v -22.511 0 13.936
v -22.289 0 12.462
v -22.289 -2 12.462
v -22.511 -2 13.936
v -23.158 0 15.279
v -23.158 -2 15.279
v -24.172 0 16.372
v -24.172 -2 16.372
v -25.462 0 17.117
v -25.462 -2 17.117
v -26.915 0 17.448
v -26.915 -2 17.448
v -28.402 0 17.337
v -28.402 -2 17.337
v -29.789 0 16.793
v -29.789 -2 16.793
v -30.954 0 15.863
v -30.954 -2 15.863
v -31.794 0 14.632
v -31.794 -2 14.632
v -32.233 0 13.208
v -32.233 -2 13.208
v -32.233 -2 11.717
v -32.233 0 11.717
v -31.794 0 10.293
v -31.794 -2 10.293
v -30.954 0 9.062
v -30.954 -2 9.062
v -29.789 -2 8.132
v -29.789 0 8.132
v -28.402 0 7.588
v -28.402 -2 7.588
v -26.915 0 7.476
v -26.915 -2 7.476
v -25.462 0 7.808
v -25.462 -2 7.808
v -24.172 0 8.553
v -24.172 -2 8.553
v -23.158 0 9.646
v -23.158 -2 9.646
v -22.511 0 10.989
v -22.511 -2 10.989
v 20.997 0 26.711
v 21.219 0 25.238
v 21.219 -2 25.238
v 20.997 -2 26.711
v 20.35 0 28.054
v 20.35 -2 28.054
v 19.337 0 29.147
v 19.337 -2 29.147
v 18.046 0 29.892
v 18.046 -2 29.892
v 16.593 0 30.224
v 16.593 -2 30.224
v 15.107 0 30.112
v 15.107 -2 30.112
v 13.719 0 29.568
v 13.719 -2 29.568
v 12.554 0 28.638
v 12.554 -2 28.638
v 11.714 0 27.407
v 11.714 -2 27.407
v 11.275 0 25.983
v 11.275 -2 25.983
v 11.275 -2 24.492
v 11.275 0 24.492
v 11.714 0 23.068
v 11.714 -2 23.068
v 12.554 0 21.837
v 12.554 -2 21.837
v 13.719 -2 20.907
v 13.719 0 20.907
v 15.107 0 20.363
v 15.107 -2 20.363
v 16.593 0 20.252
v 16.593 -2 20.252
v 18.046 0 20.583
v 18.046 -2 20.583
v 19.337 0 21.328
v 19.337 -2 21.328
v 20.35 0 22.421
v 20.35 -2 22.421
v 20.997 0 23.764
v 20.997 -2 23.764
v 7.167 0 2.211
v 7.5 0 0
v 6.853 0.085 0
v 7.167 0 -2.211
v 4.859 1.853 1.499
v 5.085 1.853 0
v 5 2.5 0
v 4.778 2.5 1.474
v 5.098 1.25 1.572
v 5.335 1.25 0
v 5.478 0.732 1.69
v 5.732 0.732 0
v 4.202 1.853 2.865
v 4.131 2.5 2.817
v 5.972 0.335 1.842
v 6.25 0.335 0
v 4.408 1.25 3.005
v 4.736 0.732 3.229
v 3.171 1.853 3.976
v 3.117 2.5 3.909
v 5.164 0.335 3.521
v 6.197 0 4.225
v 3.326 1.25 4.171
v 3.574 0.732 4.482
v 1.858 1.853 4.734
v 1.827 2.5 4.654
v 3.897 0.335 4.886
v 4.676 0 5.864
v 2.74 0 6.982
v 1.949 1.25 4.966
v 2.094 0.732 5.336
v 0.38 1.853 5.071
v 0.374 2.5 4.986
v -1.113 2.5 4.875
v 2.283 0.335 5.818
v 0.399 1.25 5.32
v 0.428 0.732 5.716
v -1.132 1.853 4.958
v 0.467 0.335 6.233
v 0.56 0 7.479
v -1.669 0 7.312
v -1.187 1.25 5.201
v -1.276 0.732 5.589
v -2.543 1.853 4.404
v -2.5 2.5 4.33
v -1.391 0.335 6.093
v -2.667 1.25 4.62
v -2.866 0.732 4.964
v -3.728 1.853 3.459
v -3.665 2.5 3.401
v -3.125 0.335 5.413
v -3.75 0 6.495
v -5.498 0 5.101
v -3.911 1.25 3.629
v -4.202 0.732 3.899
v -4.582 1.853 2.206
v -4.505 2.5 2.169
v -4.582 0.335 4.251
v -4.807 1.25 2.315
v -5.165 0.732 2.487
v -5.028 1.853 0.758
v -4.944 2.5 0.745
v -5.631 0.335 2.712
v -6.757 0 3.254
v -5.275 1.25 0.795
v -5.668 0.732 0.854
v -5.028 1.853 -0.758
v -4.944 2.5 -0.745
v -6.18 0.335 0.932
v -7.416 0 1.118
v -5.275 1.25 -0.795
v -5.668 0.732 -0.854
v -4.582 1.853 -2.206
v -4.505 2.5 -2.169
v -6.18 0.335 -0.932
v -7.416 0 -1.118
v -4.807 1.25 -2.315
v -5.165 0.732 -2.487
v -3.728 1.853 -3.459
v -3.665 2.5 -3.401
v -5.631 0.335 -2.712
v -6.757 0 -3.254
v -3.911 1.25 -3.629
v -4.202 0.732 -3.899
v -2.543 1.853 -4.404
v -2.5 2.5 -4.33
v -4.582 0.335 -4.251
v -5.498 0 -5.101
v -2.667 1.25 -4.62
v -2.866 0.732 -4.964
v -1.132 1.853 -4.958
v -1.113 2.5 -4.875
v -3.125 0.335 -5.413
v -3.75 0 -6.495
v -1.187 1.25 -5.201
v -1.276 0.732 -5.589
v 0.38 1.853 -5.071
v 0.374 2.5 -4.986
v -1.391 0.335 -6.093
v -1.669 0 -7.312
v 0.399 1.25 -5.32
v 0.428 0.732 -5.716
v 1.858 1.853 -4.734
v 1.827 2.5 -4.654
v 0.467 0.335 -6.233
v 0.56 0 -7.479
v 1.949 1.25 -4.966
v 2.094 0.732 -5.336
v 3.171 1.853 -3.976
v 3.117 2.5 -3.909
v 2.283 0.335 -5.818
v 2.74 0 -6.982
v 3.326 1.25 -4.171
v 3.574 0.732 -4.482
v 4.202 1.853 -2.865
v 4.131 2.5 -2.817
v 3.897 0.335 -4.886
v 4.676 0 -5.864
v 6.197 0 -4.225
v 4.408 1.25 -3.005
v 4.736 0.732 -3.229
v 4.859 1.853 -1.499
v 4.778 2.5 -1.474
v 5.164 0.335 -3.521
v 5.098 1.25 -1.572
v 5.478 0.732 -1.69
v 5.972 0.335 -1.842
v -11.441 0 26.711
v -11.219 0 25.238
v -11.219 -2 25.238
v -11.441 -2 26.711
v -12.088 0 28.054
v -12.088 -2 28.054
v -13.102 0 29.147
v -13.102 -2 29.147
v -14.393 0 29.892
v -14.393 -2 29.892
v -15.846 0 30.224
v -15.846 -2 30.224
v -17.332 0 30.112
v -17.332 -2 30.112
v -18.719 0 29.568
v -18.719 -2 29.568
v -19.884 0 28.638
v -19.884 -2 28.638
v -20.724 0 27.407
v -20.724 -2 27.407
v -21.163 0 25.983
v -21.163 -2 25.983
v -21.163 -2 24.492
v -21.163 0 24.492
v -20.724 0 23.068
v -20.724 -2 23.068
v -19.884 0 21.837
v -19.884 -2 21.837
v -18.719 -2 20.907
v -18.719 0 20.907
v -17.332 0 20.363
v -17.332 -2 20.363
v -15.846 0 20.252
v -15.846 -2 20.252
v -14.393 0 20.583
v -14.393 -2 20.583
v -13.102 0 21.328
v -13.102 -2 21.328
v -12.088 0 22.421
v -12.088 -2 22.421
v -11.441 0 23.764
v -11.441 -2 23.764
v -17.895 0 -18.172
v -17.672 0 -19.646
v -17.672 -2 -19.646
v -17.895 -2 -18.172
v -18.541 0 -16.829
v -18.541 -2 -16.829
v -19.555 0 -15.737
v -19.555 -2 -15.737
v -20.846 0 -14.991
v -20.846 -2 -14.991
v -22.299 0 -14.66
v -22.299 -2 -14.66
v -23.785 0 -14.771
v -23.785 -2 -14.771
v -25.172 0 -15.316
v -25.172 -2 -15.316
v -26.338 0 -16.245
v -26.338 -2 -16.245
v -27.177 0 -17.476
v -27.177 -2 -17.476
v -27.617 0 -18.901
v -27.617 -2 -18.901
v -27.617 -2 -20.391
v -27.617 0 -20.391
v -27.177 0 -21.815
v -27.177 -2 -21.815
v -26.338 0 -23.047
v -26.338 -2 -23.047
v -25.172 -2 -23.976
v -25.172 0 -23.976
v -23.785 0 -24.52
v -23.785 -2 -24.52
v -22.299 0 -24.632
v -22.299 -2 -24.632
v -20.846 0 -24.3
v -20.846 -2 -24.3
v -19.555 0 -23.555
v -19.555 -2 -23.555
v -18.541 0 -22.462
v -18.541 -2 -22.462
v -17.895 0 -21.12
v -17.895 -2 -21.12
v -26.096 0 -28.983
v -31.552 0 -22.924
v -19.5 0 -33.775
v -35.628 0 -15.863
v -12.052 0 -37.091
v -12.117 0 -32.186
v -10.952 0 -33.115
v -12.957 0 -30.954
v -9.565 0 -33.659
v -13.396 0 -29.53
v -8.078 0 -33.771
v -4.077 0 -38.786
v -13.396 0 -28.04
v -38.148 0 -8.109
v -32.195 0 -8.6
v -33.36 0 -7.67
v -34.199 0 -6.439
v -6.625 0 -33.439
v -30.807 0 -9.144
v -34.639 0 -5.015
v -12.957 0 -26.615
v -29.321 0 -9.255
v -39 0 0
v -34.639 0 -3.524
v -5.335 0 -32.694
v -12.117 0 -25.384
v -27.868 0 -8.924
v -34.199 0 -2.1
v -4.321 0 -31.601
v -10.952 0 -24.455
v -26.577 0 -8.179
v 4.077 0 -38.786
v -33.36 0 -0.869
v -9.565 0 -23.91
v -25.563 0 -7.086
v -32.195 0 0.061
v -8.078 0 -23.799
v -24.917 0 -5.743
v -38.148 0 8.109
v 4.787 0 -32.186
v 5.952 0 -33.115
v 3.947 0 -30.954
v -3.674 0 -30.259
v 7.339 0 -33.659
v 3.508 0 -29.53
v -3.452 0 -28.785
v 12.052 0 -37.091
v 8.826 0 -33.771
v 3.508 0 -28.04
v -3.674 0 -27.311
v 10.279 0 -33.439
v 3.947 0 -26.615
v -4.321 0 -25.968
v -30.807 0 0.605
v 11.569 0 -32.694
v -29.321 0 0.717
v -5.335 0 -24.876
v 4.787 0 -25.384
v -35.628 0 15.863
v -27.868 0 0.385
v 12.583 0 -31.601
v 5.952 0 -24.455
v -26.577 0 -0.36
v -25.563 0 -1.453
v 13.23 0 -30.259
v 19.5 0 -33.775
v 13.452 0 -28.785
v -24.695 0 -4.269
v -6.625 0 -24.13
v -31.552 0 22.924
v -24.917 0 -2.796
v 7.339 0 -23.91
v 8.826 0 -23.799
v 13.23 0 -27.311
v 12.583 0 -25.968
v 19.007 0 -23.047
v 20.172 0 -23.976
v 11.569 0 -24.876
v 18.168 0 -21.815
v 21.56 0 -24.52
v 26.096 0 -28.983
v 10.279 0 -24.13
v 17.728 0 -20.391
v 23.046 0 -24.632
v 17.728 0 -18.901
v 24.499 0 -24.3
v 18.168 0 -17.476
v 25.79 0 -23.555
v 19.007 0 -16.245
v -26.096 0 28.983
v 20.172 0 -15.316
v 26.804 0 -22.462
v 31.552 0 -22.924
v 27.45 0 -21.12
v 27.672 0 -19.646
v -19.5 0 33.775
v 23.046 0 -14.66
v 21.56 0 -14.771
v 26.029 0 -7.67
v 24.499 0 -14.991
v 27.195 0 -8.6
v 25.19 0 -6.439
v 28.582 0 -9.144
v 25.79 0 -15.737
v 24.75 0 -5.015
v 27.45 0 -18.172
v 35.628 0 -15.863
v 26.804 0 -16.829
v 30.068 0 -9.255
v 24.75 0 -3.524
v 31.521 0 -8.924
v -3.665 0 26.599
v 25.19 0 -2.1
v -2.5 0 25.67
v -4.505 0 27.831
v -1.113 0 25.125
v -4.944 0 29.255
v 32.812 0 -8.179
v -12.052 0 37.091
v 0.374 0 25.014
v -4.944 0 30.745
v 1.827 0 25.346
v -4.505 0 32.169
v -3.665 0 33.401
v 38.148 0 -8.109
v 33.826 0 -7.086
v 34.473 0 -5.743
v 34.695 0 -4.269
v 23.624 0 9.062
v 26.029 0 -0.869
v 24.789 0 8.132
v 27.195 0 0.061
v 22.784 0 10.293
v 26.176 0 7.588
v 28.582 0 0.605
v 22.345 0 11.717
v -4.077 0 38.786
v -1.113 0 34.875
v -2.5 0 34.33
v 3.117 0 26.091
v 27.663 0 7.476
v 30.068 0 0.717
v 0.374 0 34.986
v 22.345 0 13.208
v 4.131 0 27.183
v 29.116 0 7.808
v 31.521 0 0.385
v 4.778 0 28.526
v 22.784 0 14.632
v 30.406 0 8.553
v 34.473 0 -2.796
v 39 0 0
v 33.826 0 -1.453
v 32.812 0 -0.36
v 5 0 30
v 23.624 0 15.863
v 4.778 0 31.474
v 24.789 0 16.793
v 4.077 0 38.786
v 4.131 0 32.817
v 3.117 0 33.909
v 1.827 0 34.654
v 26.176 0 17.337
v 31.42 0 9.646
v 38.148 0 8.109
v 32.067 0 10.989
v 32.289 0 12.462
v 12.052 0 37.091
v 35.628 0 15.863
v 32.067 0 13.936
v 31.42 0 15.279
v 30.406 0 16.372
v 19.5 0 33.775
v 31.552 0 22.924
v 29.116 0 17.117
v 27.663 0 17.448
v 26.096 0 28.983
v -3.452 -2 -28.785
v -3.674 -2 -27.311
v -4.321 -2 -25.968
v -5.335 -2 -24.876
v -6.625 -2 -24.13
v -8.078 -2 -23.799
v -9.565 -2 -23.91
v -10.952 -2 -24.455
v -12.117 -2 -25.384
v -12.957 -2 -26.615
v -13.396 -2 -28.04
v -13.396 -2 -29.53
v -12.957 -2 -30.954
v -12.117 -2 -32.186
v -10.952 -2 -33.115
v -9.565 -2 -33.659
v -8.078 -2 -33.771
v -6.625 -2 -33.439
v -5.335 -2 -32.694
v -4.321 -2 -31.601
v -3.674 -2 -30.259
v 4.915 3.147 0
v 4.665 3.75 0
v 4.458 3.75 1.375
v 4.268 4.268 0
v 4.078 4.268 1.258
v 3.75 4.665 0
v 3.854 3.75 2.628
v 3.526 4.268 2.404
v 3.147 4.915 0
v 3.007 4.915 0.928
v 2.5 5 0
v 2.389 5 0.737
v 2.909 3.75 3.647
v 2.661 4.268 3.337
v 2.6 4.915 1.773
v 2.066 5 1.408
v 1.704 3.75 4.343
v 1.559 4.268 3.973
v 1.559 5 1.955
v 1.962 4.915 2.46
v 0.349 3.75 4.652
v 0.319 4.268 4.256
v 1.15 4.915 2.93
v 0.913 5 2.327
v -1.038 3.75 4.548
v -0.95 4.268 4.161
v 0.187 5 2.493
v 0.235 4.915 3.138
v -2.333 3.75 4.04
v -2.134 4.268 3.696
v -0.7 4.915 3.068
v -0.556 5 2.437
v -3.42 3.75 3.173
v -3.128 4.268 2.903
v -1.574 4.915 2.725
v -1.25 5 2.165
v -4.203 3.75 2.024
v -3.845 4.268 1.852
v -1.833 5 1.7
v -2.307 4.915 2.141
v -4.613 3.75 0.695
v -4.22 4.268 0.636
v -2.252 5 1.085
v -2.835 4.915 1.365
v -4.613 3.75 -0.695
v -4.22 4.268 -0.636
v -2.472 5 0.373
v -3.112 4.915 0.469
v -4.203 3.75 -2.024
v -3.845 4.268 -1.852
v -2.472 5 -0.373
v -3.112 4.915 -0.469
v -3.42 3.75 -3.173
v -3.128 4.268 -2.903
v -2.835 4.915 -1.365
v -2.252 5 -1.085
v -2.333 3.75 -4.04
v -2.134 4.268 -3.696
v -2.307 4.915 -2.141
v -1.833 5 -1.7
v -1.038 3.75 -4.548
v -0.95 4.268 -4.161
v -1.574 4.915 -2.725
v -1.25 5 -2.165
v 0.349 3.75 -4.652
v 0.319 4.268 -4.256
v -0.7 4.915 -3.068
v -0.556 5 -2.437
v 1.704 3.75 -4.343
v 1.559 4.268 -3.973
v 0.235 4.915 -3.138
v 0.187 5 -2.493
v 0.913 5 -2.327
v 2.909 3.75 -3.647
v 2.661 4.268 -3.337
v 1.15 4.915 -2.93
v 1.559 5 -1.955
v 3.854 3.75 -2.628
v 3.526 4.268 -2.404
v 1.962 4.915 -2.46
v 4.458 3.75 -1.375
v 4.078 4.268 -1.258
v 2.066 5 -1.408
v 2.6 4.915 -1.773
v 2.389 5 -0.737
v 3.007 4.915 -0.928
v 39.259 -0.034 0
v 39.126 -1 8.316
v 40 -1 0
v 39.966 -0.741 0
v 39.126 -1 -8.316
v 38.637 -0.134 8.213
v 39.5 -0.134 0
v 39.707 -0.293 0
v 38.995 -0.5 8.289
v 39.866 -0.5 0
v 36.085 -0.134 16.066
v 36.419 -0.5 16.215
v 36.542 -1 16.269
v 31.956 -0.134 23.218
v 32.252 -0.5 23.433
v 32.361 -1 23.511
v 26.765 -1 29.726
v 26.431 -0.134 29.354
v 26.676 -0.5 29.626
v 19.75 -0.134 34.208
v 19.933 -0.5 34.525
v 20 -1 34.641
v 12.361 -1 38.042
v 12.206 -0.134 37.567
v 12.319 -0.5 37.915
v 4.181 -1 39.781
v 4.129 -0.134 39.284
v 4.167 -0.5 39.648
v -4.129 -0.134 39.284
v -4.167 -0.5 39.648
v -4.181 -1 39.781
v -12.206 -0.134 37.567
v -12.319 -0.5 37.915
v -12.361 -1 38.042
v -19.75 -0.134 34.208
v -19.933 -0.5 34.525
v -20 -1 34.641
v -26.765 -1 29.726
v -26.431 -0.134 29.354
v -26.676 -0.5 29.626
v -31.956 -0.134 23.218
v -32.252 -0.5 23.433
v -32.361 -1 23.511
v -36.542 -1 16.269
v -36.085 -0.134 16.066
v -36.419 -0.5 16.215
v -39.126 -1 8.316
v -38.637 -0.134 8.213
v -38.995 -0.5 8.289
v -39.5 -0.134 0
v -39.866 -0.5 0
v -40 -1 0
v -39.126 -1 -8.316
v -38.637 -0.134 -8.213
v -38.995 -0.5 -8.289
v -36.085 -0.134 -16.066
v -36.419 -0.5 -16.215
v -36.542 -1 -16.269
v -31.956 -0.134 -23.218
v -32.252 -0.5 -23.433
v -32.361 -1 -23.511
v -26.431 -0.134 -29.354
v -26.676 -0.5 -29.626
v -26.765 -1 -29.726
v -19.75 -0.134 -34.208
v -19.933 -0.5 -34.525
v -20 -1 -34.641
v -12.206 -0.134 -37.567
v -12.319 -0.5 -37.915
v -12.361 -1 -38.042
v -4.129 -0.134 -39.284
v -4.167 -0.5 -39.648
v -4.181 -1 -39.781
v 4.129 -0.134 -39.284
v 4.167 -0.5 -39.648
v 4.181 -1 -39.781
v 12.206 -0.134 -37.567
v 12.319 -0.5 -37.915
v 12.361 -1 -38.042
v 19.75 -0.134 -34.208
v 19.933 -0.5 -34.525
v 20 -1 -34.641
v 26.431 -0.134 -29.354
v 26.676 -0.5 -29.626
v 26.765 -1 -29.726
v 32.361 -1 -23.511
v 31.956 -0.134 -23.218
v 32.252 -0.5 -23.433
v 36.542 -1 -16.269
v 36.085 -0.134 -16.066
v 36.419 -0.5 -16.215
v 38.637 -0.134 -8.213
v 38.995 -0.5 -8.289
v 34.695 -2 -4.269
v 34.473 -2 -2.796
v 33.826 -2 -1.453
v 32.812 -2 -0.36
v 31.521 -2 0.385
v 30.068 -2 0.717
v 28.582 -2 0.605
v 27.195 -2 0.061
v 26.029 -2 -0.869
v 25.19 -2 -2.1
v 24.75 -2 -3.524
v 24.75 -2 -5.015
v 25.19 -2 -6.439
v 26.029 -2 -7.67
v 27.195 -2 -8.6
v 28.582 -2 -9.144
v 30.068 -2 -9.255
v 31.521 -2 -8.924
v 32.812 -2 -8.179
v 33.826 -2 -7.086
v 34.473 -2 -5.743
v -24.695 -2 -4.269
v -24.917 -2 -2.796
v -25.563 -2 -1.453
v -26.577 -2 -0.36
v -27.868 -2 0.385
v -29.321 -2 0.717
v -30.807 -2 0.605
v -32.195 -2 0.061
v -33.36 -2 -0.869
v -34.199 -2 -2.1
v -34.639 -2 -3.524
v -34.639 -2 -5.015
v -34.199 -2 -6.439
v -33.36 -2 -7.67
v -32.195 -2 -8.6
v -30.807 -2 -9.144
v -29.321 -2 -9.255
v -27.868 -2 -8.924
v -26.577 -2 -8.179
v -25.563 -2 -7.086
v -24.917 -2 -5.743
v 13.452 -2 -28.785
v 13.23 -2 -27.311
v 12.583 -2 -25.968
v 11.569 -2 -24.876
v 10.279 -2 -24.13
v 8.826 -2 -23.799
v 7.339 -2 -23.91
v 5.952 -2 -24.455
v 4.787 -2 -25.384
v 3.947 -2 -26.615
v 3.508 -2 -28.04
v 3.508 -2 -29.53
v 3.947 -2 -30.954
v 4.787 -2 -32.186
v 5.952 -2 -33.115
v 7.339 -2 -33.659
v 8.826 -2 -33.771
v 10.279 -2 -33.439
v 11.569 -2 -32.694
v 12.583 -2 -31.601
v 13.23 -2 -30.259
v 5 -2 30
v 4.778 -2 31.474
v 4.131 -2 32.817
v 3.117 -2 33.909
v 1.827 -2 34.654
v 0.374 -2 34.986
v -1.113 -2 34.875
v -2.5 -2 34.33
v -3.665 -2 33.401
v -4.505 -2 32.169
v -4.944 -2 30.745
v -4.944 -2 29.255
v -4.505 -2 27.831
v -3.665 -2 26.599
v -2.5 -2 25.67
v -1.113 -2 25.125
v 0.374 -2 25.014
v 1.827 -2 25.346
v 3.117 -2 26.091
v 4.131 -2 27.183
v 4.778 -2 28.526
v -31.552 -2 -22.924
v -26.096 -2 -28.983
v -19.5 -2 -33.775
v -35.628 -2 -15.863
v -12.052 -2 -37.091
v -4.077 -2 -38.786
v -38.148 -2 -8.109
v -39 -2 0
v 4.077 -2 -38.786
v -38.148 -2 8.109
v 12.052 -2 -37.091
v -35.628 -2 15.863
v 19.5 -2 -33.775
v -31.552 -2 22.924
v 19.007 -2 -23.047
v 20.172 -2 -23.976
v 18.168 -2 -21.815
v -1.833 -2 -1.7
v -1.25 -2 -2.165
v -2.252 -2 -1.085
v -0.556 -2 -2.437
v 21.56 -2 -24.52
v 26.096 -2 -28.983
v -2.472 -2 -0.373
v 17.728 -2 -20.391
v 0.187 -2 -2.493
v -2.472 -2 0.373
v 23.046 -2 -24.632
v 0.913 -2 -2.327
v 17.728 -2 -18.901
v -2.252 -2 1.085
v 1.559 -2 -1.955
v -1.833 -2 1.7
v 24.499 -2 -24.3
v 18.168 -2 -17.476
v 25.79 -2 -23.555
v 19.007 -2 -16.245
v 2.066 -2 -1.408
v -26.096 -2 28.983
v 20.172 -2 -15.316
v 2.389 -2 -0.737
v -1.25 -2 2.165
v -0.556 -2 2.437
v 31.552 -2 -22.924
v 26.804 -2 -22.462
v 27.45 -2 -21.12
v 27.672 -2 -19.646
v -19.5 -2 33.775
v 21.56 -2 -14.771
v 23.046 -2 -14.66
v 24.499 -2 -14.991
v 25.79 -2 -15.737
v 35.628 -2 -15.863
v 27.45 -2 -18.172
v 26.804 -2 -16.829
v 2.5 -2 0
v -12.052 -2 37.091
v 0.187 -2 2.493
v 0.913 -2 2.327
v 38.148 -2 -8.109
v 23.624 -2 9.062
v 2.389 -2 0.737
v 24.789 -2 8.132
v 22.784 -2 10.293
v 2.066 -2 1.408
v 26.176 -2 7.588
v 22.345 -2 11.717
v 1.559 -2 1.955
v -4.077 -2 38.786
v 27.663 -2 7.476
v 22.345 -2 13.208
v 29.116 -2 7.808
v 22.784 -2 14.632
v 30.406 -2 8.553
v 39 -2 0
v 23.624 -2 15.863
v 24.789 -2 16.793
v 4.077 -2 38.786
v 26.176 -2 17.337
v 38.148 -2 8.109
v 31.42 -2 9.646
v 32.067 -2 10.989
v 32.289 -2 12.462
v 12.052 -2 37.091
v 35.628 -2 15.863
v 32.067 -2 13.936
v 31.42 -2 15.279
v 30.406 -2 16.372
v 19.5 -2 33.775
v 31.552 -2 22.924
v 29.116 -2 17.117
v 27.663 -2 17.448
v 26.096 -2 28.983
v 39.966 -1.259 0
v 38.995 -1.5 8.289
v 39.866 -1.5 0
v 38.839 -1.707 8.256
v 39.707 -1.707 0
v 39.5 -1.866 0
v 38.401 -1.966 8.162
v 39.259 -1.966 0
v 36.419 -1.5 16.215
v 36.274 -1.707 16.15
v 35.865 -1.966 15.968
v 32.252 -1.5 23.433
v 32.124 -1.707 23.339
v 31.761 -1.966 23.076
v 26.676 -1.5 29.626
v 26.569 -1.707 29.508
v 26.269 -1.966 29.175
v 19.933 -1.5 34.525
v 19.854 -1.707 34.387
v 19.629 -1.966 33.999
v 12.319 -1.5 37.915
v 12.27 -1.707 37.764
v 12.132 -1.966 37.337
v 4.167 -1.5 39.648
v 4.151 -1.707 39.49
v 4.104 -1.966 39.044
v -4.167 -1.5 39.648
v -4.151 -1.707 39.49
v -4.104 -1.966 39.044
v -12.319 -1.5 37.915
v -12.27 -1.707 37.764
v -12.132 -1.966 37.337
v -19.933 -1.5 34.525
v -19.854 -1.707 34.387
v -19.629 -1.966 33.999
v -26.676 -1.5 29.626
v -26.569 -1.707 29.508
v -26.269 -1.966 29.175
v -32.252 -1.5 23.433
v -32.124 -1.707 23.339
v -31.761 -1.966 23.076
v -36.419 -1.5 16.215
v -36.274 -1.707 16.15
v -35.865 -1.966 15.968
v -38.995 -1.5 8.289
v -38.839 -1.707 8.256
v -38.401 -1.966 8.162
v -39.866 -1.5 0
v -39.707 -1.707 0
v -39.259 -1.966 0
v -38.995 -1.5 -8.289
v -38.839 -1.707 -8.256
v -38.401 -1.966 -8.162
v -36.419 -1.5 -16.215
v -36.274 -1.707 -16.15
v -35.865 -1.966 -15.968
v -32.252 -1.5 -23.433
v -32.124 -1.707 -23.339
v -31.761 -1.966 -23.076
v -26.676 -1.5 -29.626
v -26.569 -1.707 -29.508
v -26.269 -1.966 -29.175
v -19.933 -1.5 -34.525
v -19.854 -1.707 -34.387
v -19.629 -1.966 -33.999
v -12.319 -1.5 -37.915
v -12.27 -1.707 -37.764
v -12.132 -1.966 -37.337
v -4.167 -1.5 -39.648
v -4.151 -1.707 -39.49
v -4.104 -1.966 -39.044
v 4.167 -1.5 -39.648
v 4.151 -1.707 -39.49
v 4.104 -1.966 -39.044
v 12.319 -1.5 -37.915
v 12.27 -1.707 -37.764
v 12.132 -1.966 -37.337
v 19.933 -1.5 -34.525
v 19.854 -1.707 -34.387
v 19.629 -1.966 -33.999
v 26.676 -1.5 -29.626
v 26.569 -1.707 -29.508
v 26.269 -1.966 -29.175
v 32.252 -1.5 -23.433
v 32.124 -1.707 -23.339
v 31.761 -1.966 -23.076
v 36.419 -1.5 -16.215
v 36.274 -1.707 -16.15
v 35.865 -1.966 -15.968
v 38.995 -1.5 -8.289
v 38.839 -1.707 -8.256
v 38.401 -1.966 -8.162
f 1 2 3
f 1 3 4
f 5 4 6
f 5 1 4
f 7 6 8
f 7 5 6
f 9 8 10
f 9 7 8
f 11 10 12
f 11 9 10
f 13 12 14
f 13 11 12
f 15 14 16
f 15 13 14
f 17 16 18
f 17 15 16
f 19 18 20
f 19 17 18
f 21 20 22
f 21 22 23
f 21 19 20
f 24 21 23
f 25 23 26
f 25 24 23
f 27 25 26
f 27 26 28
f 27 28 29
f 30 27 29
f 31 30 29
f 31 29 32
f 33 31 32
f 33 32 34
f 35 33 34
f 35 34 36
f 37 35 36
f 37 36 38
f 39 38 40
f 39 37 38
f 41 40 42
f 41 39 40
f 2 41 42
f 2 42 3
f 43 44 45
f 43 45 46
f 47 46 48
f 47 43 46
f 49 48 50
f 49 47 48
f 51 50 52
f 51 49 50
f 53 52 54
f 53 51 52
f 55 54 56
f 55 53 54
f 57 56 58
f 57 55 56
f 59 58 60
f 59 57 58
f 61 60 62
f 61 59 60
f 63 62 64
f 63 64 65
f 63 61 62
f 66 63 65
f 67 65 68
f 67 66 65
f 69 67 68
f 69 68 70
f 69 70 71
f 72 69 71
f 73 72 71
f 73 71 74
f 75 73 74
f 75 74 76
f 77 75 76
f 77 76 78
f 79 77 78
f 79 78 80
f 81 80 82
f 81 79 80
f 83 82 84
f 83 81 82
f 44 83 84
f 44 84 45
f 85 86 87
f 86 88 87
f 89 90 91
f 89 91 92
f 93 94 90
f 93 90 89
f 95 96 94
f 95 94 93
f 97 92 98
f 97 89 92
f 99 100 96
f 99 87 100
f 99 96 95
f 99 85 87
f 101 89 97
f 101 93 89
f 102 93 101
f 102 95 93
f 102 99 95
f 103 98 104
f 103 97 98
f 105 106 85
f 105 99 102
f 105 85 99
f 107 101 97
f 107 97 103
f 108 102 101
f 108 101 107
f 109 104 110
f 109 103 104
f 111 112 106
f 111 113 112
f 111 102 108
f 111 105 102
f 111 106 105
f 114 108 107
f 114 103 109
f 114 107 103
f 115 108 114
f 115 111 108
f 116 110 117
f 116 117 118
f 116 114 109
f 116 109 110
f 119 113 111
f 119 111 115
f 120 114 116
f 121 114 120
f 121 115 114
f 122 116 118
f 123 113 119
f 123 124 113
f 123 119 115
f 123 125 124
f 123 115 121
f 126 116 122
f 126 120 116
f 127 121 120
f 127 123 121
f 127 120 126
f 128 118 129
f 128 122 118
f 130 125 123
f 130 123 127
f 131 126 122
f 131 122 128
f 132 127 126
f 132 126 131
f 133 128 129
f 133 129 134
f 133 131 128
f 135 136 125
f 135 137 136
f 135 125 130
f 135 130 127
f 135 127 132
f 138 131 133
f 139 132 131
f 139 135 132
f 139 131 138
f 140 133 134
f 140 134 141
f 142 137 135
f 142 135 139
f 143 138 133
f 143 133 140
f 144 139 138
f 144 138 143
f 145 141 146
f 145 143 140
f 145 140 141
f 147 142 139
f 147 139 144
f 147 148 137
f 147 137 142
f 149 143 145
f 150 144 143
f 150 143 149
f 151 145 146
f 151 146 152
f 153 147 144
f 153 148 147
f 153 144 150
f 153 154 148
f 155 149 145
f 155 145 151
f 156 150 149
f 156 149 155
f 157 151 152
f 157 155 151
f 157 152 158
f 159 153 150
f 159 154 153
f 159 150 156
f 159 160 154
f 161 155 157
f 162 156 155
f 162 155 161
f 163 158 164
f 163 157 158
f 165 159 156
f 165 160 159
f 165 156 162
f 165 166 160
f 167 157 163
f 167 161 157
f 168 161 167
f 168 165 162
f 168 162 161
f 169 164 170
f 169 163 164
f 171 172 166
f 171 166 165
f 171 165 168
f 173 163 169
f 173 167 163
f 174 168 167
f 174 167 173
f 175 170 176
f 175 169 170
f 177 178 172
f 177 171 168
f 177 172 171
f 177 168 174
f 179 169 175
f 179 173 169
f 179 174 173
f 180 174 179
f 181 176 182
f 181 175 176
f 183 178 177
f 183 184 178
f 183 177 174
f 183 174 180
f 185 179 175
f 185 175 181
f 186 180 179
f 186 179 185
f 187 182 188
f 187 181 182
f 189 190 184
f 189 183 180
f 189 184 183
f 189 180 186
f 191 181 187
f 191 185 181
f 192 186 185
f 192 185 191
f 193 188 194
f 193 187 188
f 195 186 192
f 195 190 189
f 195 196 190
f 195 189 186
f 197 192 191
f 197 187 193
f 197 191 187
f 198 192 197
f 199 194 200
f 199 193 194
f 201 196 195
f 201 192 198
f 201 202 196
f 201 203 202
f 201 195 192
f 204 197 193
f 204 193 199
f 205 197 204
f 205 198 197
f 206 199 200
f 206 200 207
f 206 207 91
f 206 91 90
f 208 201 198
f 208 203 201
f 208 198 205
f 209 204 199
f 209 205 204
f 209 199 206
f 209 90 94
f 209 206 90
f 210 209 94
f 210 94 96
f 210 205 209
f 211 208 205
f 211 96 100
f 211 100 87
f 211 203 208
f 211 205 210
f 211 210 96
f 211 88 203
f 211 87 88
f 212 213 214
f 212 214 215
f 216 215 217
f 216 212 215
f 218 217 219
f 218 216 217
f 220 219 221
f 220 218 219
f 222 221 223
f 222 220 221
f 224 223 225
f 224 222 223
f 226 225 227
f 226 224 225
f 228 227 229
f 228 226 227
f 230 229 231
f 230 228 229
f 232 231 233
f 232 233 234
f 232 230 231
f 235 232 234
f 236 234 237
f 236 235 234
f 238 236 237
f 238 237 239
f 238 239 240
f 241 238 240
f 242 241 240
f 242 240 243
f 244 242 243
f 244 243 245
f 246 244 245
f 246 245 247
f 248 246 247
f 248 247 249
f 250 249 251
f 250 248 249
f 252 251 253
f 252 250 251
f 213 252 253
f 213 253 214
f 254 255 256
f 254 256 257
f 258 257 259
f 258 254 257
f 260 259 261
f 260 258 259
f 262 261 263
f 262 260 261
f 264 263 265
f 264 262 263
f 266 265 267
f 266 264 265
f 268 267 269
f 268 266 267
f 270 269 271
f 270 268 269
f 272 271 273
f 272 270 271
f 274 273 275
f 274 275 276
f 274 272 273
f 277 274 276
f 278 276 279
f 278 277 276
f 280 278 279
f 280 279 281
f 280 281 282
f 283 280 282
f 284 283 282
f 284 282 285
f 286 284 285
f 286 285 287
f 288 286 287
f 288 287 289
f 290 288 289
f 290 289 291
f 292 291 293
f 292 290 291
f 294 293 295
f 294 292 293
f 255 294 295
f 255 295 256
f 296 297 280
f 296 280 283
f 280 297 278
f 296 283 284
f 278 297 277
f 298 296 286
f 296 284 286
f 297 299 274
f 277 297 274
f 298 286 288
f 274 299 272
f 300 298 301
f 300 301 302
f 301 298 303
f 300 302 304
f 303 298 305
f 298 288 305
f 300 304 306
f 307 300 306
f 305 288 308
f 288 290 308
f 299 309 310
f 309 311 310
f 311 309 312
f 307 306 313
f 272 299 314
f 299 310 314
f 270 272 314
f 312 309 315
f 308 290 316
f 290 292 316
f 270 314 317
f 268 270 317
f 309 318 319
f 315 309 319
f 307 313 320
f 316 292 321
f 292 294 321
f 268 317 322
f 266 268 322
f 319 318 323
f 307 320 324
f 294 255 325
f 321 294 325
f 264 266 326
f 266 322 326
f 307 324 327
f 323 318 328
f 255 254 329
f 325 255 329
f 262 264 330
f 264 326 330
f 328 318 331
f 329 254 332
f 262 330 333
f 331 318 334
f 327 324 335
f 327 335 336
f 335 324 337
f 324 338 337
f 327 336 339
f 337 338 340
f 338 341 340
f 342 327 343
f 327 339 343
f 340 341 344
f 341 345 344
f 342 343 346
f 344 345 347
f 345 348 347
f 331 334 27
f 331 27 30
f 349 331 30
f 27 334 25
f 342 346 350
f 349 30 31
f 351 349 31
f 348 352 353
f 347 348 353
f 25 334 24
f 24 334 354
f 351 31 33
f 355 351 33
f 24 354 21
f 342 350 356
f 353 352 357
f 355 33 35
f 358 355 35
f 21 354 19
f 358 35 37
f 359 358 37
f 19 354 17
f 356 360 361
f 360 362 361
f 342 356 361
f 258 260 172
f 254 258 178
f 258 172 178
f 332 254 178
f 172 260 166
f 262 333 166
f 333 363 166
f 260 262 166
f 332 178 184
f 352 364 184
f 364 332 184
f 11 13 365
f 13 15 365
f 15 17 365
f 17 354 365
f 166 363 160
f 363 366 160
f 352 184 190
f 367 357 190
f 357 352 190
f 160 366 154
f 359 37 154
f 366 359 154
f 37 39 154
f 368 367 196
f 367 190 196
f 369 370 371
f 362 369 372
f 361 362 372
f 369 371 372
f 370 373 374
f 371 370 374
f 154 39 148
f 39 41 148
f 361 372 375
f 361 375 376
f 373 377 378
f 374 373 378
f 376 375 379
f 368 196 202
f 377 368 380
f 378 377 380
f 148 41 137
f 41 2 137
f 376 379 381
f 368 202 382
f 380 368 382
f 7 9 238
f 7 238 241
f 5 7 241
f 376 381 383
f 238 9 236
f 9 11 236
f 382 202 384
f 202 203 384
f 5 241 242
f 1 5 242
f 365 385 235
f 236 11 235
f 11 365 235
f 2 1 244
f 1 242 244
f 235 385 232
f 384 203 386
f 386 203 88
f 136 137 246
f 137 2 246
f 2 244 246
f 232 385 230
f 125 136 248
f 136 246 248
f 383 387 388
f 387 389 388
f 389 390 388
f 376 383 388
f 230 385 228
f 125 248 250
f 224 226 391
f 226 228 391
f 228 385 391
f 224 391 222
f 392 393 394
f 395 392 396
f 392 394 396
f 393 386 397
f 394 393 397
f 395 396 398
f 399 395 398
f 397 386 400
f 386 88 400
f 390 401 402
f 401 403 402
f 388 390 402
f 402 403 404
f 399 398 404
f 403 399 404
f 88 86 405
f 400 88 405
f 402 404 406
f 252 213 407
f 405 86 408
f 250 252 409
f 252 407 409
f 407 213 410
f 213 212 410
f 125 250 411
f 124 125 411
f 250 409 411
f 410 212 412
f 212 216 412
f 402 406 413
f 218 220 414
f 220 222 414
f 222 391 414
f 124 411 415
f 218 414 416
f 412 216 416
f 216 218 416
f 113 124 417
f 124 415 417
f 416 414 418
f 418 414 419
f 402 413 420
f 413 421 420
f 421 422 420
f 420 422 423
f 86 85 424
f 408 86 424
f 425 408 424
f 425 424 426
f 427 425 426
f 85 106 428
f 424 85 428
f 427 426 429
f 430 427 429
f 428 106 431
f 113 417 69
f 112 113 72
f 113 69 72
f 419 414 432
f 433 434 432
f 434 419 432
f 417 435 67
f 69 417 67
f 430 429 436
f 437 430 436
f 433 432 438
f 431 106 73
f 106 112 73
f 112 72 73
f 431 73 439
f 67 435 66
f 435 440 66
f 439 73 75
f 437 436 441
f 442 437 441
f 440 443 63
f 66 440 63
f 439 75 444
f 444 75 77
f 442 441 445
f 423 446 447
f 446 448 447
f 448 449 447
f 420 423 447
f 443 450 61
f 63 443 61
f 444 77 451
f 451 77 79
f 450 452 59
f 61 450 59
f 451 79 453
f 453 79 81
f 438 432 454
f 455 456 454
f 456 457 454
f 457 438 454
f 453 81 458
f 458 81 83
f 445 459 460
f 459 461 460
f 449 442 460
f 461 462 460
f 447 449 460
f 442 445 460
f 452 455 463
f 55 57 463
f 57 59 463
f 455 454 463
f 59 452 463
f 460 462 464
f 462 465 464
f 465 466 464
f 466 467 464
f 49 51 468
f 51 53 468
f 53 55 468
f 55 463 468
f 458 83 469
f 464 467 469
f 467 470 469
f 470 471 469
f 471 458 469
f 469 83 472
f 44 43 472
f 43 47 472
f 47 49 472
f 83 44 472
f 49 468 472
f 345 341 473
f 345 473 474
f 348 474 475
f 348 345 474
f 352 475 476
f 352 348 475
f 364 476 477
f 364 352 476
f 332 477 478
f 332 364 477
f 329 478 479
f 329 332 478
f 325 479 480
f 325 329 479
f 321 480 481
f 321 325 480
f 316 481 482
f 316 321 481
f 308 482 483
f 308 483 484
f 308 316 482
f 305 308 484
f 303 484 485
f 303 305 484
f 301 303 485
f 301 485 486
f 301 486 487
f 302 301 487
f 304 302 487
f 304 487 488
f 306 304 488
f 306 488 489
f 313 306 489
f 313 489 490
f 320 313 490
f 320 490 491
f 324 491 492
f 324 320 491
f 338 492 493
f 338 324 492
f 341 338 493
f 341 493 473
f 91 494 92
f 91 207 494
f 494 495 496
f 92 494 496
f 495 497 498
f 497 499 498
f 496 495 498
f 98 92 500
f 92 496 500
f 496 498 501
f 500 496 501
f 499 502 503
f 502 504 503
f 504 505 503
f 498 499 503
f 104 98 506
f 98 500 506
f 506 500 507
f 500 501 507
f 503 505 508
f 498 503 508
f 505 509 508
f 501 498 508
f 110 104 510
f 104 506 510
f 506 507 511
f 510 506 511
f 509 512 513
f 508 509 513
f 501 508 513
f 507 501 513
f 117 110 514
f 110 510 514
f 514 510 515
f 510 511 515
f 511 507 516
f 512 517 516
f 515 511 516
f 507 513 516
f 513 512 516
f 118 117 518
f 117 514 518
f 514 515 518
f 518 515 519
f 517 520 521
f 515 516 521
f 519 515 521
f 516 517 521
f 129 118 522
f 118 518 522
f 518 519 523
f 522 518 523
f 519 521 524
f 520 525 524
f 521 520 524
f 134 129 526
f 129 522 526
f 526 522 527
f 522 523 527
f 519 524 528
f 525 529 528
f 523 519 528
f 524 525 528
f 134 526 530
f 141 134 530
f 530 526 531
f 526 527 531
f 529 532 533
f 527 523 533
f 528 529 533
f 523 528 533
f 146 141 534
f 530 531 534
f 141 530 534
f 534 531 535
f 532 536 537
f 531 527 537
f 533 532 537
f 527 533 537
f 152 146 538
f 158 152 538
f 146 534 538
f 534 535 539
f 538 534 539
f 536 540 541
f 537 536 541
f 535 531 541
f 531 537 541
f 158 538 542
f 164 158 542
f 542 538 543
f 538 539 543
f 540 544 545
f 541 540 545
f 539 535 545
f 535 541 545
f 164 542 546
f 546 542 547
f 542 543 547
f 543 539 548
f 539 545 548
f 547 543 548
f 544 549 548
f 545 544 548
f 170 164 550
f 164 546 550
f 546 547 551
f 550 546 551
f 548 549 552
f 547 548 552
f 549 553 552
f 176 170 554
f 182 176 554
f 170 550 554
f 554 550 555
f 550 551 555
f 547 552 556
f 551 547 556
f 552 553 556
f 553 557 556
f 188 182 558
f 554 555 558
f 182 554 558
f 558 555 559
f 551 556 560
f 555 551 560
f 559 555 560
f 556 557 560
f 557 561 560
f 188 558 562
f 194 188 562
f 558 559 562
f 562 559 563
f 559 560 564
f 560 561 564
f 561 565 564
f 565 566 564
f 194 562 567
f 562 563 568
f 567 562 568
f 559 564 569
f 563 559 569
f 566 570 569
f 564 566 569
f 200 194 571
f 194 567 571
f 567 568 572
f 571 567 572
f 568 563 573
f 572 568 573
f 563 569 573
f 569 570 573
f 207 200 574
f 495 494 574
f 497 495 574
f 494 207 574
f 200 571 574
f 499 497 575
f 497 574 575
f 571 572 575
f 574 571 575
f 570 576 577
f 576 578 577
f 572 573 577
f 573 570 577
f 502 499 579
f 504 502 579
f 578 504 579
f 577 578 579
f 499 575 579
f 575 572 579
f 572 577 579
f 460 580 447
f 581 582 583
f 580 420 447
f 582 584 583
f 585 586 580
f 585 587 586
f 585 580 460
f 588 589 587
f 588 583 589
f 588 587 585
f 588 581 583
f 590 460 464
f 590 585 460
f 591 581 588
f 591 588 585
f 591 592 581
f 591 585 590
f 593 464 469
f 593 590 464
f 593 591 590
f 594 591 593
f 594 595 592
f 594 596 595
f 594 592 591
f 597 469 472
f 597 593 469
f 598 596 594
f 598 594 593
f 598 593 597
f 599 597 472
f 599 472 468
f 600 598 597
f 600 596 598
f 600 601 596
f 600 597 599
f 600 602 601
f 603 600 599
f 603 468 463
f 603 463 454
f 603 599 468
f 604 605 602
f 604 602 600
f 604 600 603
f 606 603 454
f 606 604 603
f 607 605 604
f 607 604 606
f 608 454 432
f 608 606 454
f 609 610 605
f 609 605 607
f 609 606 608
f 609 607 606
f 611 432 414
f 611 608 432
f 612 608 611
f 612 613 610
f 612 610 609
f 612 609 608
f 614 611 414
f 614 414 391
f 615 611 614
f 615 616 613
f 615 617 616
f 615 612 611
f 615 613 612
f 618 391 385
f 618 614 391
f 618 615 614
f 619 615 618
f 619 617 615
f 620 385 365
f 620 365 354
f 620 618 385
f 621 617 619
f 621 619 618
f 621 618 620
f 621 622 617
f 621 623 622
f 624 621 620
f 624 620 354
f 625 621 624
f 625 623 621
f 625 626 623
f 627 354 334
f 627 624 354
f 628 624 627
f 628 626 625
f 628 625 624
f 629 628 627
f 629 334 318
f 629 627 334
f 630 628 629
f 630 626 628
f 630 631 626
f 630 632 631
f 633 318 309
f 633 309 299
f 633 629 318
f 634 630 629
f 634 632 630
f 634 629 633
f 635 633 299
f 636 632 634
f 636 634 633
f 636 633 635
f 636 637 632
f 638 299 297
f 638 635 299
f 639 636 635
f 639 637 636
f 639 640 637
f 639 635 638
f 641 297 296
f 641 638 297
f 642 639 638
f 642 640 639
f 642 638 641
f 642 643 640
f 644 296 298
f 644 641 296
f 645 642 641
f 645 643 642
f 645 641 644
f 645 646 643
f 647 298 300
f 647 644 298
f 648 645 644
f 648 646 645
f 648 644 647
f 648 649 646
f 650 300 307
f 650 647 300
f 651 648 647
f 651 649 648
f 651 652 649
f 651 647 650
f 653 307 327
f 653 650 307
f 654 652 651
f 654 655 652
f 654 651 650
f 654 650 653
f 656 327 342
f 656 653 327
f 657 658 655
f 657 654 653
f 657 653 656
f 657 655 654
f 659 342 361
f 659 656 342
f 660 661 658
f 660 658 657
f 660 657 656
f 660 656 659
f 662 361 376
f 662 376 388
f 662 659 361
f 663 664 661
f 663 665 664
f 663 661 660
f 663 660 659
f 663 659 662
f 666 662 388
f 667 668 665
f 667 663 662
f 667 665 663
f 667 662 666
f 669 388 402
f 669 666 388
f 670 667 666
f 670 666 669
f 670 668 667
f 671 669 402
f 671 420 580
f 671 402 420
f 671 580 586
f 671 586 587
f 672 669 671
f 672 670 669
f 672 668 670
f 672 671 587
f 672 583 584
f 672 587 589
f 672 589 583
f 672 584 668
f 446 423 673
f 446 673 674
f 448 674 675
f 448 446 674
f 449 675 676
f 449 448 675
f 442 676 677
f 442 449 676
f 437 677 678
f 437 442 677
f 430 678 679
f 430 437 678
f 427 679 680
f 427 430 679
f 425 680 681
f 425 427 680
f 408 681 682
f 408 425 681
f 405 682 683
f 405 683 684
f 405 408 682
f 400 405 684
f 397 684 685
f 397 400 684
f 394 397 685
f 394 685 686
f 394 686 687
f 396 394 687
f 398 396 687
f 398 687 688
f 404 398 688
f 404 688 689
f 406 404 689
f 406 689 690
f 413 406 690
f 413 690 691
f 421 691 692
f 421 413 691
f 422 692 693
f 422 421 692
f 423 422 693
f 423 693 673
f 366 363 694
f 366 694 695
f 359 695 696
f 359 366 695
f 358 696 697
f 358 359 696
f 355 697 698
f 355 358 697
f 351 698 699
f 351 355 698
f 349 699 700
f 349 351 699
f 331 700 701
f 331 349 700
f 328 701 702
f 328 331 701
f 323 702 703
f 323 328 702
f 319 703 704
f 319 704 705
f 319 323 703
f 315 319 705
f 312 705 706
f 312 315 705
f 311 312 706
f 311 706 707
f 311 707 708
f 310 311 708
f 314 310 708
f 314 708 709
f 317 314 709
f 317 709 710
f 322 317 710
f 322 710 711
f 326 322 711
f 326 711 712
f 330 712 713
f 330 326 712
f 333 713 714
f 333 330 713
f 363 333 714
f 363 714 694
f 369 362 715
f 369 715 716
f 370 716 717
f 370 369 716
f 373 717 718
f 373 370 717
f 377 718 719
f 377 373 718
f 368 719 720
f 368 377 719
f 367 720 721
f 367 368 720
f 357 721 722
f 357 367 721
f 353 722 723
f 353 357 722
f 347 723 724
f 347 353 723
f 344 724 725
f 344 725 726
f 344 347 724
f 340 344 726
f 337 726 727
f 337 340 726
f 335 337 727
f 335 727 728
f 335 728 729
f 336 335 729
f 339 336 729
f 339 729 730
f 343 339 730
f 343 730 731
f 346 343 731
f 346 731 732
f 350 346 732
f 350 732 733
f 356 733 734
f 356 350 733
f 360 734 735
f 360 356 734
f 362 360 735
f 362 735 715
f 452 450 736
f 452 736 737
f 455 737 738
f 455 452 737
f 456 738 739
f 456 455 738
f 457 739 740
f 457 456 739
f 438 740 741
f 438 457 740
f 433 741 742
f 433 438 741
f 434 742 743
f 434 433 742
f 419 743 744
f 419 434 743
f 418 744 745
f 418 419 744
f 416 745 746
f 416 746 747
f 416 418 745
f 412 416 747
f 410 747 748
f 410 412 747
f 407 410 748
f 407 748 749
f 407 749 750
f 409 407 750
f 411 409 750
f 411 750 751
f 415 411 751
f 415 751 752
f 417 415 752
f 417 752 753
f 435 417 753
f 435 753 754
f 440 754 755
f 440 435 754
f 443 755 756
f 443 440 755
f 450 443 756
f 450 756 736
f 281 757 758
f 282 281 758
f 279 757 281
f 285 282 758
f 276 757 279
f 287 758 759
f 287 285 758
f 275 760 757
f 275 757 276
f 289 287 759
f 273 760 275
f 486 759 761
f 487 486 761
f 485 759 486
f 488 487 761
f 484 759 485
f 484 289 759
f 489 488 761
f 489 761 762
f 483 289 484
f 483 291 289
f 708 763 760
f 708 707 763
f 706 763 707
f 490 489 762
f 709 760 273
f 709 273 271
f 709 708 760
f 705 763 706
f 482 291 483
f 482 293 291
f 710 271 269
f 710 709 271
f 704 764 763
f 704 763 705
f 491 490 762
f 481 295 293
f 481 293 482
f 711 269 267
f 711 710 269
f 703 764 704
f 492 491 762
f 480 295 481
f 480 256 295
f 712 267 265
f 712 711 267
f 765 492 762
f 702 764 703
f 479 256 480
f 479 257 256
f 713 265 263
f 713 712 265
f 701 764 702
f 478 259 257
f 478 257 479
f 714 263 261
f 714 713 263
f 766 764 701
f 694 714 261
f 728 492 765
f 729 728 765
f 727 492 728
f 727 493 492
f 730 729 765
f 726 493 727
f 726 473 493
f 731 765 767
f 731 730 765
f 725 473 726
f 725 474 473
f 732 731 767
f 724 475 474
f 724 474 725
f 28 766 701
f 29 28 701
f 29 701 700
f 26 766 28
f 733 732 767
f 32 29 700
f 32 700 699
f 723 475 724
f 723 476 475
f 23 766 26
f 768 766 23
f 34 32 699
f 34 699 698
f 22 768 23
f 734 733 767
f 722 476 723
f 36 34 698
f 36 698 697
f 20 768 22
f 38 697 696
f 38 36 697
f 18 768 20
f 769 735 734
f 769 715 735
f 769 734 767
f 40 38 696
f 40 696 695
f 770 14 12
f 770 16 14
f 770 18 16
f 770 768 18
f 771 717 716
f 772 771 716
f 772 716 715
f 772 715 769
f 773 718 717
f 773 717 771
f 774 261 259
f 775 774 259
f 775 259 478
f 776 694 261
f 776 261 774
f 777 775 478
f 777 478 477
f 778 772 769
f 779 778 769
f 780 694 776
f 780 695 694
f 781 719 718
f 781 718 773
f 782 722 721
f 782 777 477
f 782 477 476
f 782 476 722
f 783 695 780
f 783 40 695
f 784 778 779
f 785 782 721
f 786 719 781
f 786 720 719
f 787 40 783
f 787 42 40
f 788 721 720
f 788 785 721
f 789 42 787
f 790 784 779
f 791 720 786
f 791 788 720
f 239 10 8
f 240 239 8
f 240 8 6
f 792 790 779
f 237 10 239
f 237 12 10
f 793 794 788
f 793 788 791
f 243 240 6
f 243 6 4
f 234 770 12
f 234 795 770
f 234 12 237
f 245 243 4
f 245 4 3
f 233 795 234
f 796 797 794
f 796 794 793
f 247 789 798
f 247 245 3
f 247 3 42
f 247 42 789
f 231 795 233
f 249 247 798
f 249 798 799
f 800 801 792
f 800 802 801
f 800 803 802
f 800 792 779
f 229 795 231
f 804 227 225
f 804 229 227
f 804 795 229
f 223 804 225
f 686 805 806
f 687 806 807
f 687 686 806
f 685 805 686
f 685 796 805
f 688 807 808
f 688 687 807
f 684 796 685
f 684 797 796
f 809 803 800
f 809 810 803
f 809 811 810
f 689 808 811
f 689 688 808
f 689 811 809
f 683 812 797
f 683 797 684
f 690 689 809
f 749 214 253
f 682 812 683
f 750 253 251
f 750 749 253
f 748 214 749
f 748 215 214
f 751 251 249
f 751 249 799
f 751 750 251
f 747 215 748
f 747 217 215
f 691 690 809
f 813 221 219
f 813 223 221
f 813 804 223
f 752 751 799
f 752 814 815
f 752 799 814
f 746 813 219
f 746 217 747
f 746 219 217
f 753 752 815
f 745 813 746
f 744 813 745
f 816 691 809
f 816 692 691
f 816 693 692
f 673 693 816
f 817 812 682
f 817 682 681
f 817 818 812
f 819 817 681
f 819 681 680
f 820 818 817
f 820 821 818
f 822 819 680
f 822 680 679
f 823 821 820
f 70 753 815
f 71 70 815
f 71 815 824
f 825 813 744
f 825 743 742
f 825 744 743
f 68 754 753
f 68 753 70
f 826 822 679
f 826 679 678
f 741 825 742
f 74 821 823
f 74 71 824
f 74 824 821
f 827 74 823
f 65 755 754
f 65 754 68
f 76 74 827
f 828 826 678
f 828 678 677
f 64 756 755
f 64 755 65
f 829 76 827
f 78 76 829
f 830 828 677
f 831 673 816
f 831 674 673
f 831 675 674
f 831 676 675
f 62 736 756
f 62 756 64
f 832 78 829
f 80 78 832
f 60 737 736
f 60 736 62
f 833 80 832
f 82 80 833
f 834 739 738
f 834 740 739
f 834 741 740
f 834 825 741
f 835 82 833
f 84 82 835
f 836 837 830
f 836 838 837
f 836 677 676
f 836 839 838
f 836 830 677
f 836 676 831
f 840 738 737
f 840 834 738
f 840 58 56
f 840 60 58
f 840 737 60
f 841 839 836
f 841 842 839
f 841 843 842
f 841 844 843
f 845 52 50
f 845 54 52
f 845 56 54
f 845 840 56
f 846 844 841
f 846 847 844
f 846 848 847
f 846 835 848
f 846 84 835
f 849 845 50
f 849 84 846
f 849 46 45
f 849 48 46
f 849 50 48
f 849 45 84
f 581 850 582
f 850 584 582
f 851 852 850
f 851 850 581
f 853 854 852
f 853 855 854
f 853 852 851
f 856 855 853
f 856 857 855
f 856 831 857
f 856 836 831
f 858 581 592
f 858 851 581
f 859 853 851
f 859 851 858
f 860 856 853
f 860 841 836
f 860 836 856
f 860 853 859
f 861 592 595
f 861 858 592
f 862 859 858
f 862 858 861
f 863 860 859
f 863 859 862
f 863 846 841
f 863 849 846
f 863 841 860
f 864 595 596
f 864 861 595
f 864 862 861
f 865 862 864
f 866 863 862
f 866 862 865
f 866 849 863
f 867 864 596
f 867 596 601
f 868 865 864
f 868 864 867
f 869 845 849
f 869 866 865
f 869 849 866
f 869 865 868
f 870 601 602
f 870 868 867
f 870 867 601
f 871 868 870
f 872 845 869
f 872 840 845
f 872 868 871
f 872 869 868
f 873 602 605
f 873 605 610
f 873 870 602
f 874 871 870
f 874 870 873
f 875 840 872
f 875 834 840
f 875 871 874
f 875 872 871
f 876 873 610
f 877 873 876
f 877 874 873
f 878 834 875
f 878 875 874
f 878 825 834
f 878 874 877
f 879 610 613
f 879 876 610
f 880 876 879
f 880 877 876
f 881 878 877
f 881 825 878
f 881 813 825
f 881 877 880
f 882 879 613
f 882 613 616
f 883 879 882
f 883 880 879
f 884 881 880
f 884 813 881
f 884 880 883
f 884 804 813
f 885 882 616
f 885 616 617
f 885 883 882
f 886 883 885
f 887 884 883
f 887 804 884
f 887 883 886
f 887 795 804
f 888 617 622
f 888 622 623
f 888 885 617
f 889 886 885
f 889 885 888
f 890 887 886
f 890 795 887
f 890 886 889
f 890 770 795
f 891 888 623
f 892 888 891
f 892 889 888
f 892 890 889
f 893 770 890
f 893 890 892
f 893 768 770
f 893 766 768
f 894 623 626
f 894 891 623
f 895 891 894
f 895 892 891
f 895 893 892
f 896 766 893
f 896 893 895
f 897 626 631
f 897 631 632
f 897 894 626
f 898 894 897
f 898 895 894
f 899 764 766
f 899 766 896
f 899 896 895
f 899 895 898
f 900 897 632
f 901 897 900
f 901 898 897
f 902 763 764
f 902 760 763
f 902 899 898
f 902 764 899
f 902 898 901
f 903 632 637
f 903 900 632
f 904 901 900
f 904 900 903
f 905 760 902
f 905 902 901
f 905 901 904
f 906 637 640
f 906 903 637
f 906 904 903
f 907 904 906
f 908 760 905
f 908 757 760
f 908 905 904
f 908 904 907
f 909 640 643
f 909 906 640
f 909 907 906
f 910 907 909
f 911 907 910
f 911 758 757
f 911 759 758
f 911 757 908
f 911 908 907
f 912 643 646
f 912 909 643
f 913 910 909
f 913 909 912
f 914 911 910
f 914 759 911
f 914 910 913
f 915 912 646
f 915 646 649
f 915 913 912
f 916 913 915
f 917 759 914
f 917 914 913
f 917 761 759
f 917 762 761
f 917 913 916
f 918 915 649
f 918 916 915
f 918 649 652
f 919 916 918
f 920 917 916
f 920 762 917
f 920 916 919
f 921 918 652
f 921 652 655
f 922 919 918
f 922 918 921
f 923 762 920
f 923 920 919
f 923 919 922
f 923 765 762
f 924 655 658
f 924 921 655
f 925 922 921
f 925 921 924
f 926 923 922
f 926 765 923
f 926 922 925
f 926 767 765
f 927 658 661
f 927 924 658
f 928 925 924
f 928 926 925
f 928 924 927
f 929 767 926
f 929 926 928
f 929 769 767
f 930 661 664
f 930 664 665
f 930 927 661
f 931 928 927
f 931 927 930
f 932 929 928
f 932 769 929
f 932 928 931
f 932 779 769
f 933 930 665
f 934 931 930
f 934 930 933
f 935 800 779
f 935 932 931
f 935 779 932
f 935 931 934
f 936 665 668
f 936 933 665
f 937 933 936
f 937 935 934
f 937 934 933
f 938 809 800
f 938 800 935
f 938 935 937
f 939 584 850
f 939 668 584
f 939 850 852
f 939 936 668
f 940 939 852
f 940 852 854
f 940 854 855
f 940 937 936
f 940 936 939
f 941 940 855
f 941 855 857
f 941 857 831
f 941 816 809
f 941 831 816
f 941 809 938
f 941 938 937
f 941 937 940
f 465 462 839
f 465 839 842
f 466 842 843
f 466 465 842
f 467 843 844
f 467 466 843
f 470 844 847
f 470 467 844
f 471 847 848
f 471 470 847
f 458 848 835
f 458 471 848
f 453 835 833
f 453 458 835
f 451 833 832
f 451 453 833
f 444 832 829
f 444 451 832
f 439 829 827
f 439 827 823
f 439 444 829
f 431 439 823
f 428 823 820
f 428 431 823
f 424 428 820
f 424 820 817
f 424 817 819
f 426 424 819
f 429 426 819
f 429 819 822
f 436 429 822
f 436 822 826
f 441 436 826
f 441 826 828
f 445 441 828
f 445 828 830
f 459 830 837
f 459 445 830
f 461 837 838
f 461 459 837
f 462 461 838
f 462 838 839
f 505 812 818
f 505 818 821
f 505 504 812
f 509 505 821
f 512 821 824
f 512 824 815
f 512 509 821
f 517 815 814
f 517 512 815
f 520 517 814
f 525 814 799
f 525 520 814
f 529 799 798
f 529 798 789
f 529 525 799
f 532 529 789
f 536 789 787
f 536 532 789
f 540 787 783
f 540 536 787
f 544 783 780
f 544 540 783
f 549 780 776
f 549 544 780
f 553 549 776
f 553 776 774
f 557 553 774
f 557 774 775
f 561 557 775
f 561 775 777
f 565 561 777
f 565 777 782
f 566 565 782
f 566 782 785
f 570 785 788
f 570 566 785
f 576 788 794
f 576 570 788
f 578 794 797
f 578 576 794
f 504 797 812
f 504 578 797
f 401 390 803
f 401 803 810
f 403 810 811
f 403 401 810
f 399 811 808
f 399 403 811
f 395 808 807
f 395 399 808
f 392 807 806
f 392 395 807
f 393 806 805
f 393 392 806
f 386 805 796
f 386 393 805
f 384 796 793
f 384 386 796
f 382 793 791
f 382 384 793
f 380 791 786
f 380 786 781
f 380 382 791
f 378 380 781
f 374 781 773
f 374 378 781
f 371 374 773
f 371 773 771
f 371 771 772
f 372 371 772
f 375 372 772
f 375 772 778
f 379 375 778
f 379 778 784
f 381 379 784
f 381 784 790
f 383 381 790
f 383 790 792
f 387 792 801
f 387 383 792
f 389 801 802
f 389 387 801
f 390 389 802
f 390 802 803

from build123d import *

# Parameters (mm, degrees)
F0_R     = 40
F0_R_2   = 5.0000025111
F0_R_3   = 2.5
F1_DEPTH = 2
F2_R     = 5
F2_R_2   = 2.5
F3_DEPTH = 5
F4_R     = 2.49999
F5_R     = 0.99999


# Not quite as in the source:
# - a fillet or chamfer is up to 0.001 mm smaller than in the source, because OpenCascade refuses the exact size


with BuildPart() as f1:
    # F0 (on Front) → F1 (new body)
    with BuildSketch(Plane.XZ):
        Circle(F0_R)
        with Locations((-8.4519767052, -28.7847892084)):
            Circle(F0_R_2, mode=Mode.SUBTRACT)
        with Locations((-22.6724872306, -19.6458220184)):
            Circle(F0_R_2, mode=Mode.SUBTRACT)
        with Locations((-29.6946432564, -4.2694451482)):
            Circle(F0_R_2, mode=Mode.SUBTRACT)
        with Locations((8.4519767052, -28.7847892084)):
            Circle(F0_R_2, mode=Mode.SUBTRACT)
        with Locations((22.6724872306, -19.6458220184)):
            Circle(F0_R_2, mode=Mode.SUBTRACT)
        with Locations((29.6946432564, -4.2694451482)):
            Circle(F0_R_2, mode=Mode.SUBTRACT)
        with Locations((-27.2889598606, 12.4624503901)):
            Circle(F0_R_2, mode=Mode.SUBTRACT)
        with Locations((-16.2192245237, 25.2376059849)):
            Circle(F0_R_2, mode=Mode.SUBTRACT)
        Circle(F0_R_3, mode=Mode.SUBTRACT)
        with Locations((27.2889598606, 12.4624503901)):
            Circle(F0_R_2, mode=Mode.SUBTRACT)
        with Locations((16.2192245237, 25.2376059849)):
            Circle(F0_R_2, mode=Mode.SUBTRACT)
        with Locations((0, 30)):
            Circle(F0_R_2, mode=Mode.SUBTRACT)
    extrude(amount=F1_DEPTH)

    # F2 (on Front) → F3 (join)
    with BuildSketch(Plane.XZ):
        Circle(F2_R)
        Circle(F2_R_2, mode=Mode.SUBTRACT)
    extrude(amount=-F3_DEPTH)

    # F4 (radius 2.5 in the source; OpenCascade refuses exactly that, so slightly less here)
    f4_edges = [f1.edges().sort_by_distance(p)[0] for p in [
        (-5, 0, 0),
        (-5, 5, 0),
    ]]
    fillet(f4_edges, radius=F4_R)

    # F5 (radius 1 in the source; OpenCascade refuses exactly that, so slightly less here)
    f5_edges = [f1.edges().sort_by_distance(p)[0] for p in [
        (40, -1, 0),
        (-40, 0, 0),
        (-40, -2, 0),
    ]]
    fillet(f5_edges, radius=F5_R)


solid = f1.part
